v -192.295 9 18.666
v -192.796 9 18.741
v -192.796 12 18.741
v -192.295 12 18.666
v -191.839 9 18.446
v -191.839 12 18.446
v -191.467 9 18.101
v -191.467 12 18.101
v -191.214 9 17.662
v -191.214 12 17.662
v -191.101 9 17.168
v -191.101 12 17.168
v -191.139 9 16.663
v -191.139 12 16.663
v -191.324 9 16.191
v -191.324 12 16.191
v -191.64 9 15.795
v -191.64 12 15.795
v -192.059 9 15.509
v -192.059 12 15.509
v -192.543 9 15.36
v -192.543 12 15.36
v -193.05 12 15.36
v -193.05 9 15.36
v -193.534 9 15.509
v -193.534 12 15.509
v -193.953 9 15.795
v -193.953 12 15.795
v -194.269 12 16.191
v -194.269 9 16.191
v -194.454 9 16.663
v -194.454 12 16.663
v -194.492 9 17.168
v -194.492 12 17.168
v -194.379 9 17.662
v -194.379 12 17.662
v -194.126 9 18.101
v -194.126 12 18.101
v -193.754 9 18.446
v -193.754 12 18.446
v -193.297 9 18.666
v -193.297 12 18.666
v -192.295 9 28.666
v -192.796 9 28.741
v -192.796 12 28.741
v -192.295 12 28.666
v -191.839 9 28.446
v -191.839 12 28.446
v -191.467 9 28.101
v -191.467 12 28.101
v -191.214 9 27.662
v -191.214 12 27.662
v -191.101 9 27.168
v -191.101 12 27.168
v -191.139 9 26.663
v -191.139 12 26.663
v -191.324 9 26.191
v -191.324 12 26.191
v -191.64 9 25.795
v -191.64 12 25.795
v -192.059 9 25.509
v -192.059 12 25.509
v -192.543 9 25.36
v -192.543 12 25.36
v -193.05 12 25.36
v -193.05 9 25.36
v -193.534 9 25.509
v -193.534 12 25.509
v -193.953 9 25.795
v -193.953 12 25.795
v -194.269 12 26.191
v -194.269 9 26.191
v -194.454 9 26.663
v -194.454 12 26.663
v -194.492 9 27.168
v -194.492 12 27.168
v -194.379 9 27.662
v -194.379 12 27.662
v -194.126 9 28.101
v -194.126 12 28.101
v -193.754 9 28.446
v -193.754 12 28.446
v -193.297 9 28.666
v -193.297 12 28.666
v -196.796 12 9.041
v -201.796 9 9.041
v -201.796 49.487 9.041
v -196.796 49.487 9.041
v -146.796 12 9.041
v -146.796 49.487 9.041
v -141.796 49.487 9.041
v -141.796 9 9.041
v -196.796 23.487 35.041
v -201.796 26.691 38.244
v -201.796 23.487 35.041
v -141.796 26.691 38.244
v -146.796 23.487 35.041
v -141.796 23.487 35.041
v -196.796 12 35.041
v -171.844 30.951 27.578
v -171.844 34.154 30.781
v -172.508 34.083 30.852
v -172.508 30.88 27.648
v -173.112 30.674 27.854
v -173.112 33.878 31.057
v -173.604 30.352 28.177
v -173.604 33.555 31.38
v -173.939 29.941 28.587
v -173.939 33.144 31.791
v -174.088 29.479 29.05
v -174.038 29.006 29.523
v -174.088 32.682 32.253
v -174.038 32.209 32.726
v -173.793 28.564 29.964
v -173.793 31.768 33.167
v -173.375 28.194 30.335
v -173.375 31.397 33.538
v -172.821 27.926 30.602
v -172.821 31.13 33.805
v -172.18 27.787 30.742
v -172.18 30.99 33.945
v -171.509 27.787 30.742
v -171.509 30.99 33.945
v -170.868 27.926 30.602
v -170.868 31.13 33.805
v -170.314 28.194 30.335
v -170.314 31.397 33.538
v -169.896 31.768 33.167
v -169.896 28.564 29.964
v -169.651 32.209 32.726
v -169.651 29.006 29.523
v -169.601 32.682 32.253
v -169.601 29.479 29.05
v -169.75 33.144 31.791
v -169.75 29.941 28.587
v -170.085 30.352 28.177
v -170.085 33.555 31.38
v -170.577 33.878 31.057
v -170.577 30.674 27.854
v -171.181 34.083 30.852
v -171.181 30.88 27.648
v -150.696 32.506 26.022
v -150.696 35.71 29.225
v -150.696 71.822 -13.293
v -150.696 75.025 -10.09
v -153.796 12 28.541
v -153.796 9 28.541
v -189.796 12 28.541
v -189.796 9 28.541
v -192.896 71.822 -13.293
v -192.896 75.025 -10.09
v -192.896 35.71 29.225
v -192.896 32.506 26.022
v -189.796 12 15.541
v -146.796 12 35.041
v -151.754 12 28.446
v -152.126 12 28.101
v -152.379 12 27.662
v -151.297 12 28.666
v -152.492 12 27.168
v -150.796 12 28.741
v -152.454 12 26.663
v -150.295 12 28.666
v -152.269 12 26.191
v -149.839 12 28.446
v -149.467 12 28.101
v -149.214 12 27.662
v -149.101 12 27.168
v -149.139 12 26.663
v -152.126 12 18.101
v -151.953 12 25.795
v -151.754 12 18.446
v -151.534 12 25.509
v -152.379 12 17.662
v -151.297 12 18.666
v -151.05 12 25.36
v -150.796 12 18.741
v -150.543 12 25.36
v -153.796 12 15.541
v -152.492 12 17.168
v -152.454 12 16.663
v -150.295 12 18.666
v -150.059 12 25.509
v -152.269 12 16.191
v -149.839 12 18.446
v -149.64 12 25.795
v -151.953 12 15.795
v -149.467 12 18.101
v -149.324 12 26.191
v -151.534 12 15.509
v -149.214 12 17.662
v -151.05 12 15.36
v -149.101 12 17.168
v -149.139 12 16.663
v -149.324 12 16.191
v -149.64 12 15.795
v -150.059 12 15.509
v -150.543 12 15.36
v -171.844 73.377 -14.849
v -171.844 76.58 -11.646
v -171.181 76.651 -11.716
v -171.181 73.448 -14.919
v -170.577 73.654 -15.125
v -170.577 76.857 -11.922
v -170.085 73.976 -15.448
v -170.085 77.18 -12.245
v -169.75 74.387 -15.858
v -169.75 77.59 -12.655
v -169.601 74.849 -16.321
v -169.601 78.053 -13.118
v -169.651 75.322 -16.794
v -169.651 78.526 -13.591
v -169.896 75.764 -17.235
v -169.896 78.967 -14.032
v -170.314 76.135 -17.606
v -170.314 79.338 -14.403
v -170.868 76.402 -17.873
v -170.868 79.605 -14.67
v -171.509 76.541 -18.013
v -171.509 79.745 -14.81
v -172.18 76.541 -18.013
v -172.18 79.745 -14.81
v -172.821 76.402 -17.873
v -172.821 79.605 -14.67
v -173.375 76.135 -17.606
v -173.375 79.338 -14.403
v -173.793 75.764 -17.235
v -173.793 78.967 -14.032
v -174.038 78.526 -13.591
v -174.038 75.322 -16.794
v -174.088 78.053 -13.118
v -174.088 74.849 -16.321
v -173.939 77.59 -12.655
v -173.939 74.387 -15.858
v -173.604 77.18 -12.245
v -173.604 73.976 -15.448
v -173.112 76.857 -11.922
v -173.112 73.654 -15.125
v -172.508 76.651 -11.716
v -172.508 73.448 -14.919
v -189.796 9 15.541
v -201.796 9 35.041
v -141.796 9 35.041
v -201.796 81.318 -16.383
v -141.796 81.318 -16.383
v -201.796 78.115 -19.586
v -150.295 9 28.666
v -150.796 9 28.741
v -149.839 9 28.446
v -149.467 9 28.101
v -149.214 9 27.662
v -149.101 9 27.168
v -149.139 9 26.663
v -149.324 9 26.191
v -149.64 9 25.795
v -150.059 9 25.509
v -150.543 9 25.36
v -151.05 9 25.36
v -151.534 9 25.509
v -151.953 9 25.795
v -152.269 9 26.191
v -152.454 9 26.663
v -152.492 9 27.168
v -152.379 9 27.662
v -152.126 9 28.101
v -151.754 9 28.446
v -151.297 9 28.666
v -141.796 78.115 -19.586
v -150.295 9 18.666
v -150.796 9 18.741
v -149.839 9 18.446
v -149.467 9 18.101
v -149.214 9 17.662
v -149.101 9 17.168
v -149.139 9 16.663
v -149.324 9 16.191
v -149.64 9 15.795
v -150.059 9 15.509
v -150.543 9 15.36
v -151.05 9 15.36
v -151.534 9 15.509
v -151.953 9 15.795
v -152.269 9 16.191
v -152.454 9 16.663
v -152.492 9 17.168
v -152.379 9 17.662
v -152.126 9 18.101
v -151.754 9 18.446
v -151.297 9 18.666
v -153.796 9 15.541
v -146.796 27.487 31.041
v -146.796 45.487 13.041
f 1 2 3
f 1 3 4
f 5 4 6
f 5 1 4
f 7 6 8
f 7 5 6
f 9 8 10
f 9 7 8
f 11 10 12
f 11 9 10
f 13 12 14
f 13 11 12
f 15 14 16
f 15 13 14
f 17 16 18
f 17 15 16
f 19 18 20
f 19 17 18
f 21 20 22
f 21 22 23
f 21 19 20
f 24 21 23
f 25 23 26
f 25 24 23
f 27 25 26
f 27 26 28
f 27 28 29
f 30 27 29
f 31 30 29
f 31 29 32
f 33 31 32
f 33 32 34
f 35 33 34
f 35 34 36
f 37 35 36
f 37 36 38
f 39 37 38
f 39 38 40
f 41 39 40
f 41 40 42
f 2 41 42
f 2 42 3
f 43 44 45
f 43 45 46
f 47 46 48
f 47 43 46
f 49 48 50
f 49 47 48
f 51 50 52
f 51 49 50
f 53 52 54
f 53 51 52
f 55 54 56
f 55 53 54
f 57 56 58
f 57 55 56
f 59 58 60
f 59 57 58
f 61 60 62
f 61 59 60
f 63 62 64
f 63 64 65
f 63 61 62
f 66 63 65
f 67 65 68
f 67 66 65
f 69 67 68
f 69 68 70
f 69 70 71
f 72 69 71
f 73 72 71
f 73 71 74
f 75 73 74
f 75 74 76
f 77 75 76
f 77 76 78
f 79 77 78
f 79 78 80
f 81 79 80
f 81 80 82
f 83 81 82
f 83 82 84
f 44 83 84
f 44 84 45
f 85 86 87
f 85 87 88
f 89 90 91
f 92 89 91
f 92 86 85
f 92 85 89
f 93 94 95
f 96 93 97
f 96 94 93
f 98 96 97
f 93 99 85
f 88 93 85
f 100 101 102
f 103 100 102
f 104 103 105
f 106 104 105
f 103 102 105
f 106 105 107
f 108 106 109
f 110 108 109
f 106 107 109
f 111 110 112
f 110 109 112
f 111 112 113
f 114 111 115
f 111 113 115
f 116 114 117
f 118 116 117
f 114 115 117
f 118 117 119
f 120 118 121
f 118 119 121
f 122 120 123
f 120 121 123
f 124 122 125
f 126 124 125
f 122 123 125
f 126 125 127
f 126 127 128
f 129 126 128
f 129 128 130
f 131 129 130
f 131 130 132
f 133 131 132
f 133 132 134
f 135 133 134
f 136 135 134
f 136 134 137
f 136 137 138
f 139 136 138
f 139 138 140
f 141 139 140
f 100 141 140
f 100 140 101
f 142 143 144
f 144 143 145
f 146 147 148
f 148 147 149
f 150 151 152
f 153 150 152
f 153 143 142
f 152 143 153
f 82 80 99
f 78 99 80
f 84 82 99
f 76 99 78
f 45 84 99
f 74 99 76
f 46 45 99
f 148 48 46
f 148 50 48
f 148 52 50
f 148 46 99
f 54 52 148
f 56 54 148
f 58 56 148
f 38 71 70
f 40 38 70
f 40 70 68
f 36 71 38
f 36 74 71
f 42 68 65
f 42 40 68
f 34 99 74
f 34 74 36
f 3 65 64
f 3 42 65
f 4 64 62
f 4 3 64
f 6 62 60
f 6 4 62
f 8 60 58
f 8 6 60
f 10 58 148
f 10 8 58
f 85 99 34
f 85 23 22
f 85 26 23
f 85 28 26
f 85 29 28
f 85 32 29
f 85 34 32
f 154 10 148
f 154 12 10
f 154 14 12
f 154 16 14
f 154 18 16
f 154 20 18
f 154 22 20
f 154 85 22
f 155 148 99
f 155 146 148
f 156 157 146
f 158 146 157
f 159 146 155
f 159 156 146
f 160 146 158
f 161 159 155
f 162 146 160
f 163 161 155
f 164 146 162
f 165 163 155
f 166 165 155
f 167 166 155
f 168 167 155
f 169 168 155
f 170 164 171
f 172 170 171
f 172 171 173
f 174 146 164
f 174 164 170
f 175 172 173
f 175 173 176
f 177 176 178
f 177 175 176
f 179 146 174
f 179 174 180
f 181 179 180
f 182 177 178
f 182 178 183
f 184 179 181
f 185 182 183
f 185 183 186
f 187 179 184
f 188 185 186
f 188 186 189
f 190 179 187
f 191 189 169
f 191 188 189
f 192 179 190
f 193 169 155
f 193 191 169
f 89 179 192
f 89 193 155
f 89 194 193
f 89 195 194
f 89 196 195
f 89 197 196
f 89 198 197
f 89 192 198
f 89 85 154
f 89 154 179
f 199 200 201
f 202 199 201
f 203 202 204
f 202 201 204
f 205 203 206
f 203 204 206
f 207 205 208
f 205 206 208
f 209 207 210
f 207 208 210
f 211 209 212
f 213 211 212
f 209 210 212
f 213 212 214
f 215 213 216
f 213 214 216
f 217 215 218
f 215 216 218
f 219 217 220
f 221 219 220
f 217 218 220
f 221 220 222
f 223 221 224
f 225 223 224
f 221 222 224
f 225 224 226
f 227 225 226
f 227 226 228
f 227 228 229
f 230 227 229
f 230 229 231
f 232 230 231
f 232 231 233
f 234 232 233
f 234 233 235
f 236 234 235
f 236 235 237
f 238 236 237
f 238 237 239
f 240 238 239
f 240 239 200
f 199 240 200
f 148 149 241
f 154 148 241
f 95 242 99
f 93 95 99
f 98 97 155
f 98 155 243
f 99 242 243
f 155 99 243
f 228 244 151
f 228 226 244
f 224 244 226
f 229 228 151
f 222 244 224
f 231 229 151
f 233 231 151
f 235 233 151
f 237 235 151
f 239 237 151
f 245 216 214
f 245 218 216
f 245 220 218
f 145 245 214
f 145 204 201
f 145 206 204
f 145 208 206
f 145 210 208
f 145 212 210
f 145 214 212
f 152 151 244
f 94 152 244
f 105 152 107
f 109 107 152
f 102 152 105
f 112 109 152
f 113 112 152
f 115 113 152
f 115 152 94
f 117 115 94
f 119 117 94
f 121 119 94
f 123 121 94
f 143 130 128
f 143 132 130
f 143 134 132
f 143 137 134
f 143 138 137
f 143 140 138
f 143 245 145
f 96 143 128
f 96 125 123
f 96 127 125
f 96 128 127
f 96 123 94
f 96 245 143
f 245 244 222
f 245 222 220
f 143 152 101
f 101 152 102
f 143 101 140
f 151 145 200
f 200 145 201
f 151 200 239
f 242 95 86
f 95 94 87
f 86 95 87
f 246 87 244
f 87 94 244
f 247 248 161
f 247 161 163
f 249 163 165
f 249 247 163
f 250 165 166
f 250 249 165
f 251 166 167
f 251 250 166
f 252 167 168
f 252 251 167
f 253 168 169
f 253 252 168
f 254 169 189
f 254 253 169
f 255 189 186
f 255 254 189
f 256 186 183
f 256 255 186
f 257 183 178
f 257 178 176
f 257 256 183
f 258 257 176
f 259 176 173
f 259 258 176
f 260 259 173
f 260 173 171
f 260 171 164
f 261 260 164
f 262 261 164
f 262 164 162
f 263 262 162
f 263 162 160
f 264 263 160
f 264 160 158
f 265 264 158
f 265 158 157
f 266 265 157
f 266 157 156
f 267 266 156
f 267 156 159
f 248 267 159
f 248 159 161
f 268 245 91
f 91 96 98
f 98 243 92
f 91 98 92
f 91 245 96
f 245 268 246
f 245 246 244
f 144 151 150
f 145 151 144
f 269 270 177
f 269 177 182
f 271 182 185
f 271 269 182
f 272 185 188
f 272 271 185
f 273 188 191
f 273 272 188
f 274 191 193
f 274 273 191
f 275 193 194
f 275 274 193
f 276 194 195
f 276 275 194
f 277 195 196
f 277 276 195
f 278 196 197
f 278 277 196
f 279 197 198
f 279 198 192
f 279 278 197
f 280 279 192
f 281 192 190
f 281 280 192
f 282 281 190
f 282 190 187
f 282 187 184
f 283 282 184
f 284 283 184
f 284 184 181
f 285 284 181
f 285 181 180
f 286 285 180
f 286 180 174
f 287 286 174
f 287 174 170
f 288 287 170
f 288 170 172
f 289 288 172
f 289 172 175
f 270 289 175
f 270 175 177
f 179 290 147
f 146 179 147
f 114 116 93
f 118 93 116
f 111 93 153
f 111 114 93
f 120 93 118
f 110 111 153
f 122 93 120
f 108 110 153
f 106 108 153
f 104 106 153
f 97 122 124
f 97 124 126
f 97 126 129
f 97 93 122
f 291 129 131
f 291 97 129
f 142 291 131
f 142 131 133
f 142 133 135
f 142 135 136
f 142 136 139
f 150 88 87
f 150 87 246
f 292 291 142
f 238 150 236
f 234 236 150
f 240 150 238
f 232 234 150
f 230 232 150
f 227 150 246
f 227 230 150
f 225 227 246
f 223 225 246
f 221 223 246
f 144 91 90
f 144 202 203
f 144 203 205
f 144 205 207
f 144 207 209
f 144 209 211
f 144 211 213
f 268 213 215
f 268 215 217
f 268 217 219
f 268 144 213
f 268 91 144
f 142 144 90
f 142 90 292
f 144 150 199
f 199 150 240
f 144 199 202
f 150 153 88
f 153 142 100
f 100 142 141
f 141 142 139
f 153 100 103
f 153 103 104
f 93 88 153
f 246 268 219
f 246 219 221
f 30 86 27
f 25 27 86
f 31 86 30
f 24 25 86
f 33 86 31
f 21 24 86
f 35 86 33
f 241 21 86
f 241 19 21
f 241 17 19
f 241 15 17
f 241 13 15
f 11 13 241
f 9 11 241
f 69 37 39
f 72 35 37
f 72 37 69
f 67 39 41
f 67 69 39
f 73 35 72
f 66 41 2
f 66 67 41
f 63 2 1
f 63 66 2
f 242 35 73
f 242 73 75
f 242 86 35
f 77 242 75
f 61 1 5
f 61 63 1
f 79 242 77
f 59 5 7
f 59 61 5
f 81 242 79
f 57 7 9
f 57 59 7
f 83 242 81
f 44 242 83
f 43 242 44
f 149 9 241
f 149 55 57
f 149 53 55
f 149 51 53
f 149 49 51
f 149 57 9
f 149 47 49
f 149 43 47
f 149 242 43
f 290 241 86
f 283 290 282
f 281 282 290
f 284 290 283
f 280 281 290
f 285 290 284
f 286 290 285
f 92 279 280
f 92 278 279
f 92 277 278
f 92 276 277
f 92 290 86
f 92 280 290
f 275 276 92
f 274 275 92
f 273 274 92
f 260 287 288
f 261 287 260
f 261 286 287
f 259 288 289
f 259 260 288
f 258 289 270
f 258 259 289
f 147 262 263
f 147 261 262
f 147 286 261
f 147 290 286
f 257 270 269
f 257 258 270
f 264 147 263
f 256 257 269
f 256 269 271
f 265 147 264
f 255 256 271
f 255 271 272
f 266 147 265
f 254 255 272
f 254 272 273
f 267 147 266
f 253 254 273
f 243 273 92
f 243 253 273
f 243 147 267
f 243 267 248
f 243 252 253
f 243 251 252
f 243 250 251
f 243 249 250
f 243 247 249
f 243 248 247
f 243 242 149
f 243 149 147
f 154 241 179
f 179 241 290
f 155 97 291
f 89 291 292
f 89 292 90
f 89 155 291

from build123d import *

# Parameters (mm, degrees)
SKETCH_1_W                  = 60
SKETCH_1_H                  = 26
SKETCH_1_R                  = 1.7
EXTRUDE_3_DEPTH             = 12
SKETCH_10_W                 = 5
SKETCH_10_H                 = 4
EXTRUDE_4_DEPTH             = 60
EXTRUDE_START               = -60
EXTRUDE_6_DEPTH             = 60
CUT_EXTRUDE_6_REACH         = 219.643
SKETCH_20_W                 = 5
SKETCH_20_H                 = 4
CUT_EXTRUDE_7_REACH         = 219.643
SKETCH_21_W                 = 5
SKETCH_21_H                 = 4
CUT_EXTRUDE_8_REACH         = 219.643
SKETCH_22_W                 = 5
SKETCH_22_H                 = 4
SKETCH_23_R                 = 2.25
CUT_EXTRUDE_9_DEPTH         = 10
EXTRUDE_8_REACH             = 218.77
SKETCH_24_W                 = 5
SKETCH_24_H                 = 18
EXTRUDE_8_DIRECTION_2_REACH = 218.77
EXTRUDE_START_2             = -146.796406348
EXTRUDE_9_DEPTH             = 5
SKETCH_28_W                 = 60
SKETCH_28_H                 = 9
CUT_EXTRUDE_10_DEPTH        = 26


with BuildPart() as part:
    # 草图1 → 凸台-拉伸3 (new body)
    with BuildSketch(Plane(origin=(0, 0, 0), x_dir=(1, 0, 0), z_dir=(0, 1, 0))):
        with Locations((-171.796406348, -22.041144508)):
            Rectangle(SKETCH_1_W, SKETCH_1_H)
        with Locations(Location((-150.796406348, -17.041144508, 0), (0, 0, 270))):
            Circle(SKETCH_1_R, mode=Mode.SUBTRACT)
        with Locations(Location((-150.796406348, -27.041144508, 0), (0, 0, 270))):
            Circle(SKETCH_1_R, mode=Mode.SUBTRACT)
        with Locations(Location((-192.796406348, -27.041144508, 0), (0, 0, 270))):
            Circle(SKETCH_1_R, mode=Mode.SUBTRACT)
        with Locations(Location((-198.796406348, -27.041144508, 0), (0, 0, 270))):
            Circle(SKETCH_1_R, mode=Mode.SUBTRACT)
        with Locations(Location((-198.796406348, -17.041144508, 0), (0, 0, 270))):
            Circle(SKETCH_1_R, mode=Mode.SUBTRACT)
        with Locations(Location((-192.796406348, -17.041144508, 0), (0, 0, 270))):
            Circle(SKETCH_1_R, mode=Mode.SUBTRACT)
        with Locations(Location((-144.796406348, -27.041144508, 0), (0, 0, 270))):
            Circle(SKETCH_1_R, mode=Mode.SUBTRACT)
        with Locations(Location((-144.796406348, -17.041144508, 0), (0, 0, 270))):
            Circle(SKETCH_1_R, mode=Mode.SUBTRACT)
        Polygon((-154.244576261, -28.541144508), (-153.796406348, -28.541144508), (-153.796406348, -27.585746487), (-153.796406348, -16.496542529), (-153.796406348, -15.541144508), (-154.244576261, -15.541144508), (-160.170728493, -15.541144508), (-183.422084204, -15.541144508), (-189.348236436, -15.541144508), (-189.796406348, -15.541144508), (-189.796406348, -16.496542529), (-189.796406348, -27.585746487), (-189.796406348, -28.541144508), (-189.348236436, -28.541144508), (-183.422084204, -28.541144508), (-160.170728493, -28.541144508), align=None, mode=Mode.SUBTRACT)
    extrude(amount=EXTRUDE_3_DEPTH)

    # 草图10 → 凸台-拉伸4 (add)
    with BuildSketch(Plane(origin=(0, 12, 0), x_dir=(1, 0, 0), z_dir=(0, 1, 0))):
        with Locations((-144.296406348, -11.041144508)):
            Rectangle(SKETCH_10_W, SKETCH_10_H)
        with Locations((-199.296406348, -11.041144508)):
            Rectangle(SKETCH_10_W, SKETCH_10_H)
        with Locations((-199.296406348, -33.041144508)):
            Rectangle(SKETCH_10_W, SKETCH_10_H)
        with Locations((-144.296406348, -33.041144508)):
            Rectangle(SKETCH_10_W, SKETCH_10_H)
    extrude(amount=EXTRUDE_4_DEPTH)

    # 草图16 → 凸台-拉伸6 (add)
    with BuildSketch(Plane.ZY.offset(201.796406348).offset(EXTRUDE_START)):
        Polygon((35.041144508, 23.487382081), (-19.586360532, 78.114887122), (-16.383147731, 81.318099924), (38.24435731, 26.690594883), align=None)
    extrude(amount=EXTRUDE_6_DEPTH)

    # 切除-拉伸6: up to this plane
    cut_extrude_6_end = Plane(origin=(-60.011420854, 81.318099924, -16.383147731), z_dir=(0, 0.707106781186548, 0.7071067811865472))
    # 草图20 → 切除-拉伸6 (cut, up to the surface)
    with BuildSketch(Plane(origin=(0, 72, 0), x_dir=(1, 0, 0), z_dir=(0, 1, 0)), mode=Mode.PRIVATE) as cut_extrude_6_sk1:
        with Locations((-199.296406348, -11.041144508)):
            Rectangle(SKETCH_20_W, SKETCH_20_H)
    cut_extrude_6_tool1 = split(extrude(cut_extrude_6_sk1.sketch, amount=-CUT_EXTRUDE_6_REACH, mode=Mode.PRIVATE), bisect_by=cut_extrude_6_end, keep=Keep.BOTH, mode=Mode.PRIVATE)
    add(cut_extrude_6_tool1.solids().sort_by_distance((-199.296406, 72, 11.041145))[0], mode=Mode.SUBTRACT)

    # 切除-拉伸7: up to this face of the body (flat: up to its plane)
    cut_extrude_7_end = Plane(part.part.faces().sort_by_distance((-171.967338534, 54.279900151, 10.655052042))[0])
    # 草图21 → 切除-拉伸7 (cut, up to the picked face)
    with BuildSketch(Plane(origin=(0, 72, 0), x_dir=(1, 0, 0), z_dir=(0, 1, 0)), mode=Mode.PRIVATE) as cut_extrude_7_sk1:
        with Locations((-199.296406348, -33.041144508)):
            Rectangle(SKETCH_21_W, SKETCH_21_H)
    cut_extrude_7_tool1 = split(extrude(cut_extrude_7_sk1.sketch, amount=-CUT_EXTRUDE_7_REACH, mode=Mode.PRIVATE), bisect_by=cut_extrude_7_end, keep=Keep.BOTH, mode=Mode.PRIVATE)
    add(cut_extrude_7_tool1.solids().sort_by(Axis((-199.296406, 72, 33.041145), (0, -1, 0)))[0], mode=Mode.SUBTRACT)

    # 切除-拉伸8: up to this face of the body (flat: up to its plane)
    cut_extrude_8_end = Plane(part.part.faces().sort_by_distance((-172.136158915, 54.141614108, 10.793338085))[0])
    # 草图22 → 切除-拉伸8 (cut, up to the picked face)
    with BuildSketch(Plane(origin=(0, 72, 0), x_dir=(1, 0, 0), z_dir=(0, 1, 0)), mode=Mode.PRIVATE) as cut_extrude_8_sk1:
        with Locations((-144.296406348, -11.041144508)):
            Rectangle(SKETCH_22_W, SKETCH_22_H)
    cut_extrude_8_tool1 = split(extrude(cut_extrude_8_sk1.sketch, amount=-CUT_EXTRUDE_8_REACH, mode=Mode.PRIVATE), bisect_by=cut_extrude_8_end, keep=Keep.BOTH, mode=Mode.PRIVATE)
    # 草图22 → 切除-拉伸8 (cut, up to the picked face)
    with BuildSketch(Plane(origin=(0, 72, 0), x_dir=(1, 0, 0), z_dir=(0, 1, 0)), mode=Mode.PRIVATE) as cut_extrude_8_sk2:
        with Locations((-144.296406348, -33.041144508)):
            Rectangle(SKETCH_22_W, SKETCH_22_H)
    cut_extrude_8_tool2 = split(extrude(cut_extrude_8_sk2.sketch, amount=-CUT_EXTRUDE_8_REACH, mode=Mode.PRIVATE), bisect_by=cut_extrude_8_end, keep=Keep.BOTH, mode=Mode.PRIVATE)
    add(cut_extrude_8_tool1.solids().sort_by(Axis((-144.296406, 72, 11.041145), (0, -1, 0)))[0], mode=Mode.SUBTRACT)
    add(cut_extrude_8_tool2.solids().sort_by(Axis((-144.296406, 72, 33.041145), (0, -1, 0)))[0], mode=Mode.SUBTRACT)

    # 草图23 → 切除-拉伸9 (cut)
    with BuildSketch(Plane(origin=(0, 32.467476097, 32.467476097), x_dir=(1, 0, 0), z_dir=(0, 0.7071067811865478, 0.7071067811865472))):
        Polygon((-150.696406348, 25.486333053), (-150.696406348, 4.585214747), (-192.896406348, 4.585214747), (-192.896406348, 25.486333053), (-192.896406348, 57.849143044), (-192.896406348, 60.185214747), (-150.696406348, 60.185214747), (-150.696406348, 57.849143044), align=None)
        with Locations(Location((-171.844403565, 64.635214747, 0), (0, 0, 270))):
            Circle(SKETCH_23_R)
        with Locations(Location((-171.844403565, 0.135214747, 0), (0, 0, 90))):
            Circle(SKETCH_23_R)
    extrude(amount=-CUT_EXTRUDE_9_DEPTH, mode=Mode.SUBTRACT)

    # 草图24 → 凸台-拉伸8 (add, up to next)
    with BuildSketch(Plane(origin=(0, 12, 0), x_dir=(1, 0, 0), z_dir=(0, 1, 0)), mode=Mode.PRIVATE) as extrude_8_sk1:
        with Locations((-199.296406348, -22.041144508)):
            Rectangle(SKETCH_24_W, SKETCH_24_H)
    extrude_8_tool1 = extrude(extrude_8_sk1.sketch, amount=EXTRUDE_8_REACH, mode=Mode.PRIVATE) - part.part
    add(extrude_8_tool1.solids().sort_by_distance((-199.296406, 12, 22.041145))[0])

    # 凸台-拉伸8 direction 2: up to this face of the body (flat: up to its plane)
    extrude_8_direction_2_end = Plane(part.part.faces().sort_by_distance((-142.450317657, 0, 22.041144508))[0])
    # 草图24 → 凸台-拉伸8 direction 2 (add, up to the picked face)
    with BuildSketch(Plane(origin=(0, 12, 0), x_dir=(1, 0, 0), z_dir=(0, 1, 0)), mode=Mode.PRIVATE) as extrude_8_direction_2_sk1:
        with Locations((-199.296406348, -22.041144508)):
            Rectangle(SKETCH_24_W, SKETCH_24_H)
    extrude_8_direction_2_tool1 = split(extrude(extrude_8_direction_2_sk1.sketch, amount=-EXTRUDE_8_DIRECTION_2_REACH, mode=Mode.PRIVATE), bisect_by=extrude_8_direction_2_end, keep=Keep.BOTH, mode=Mode.PRIVATE)
    add(extrude_8_direction_2_tool1.solids().sort_by(Axis((-199.296406, 12, 22.041145), (0, -1, 0)))[0])

    # 凸台-拉伸9: read off the stored shape, not the designer's step
    # 凸台-拉伸9 outline → 凸台-拉伸9 (add)
    with BuildSketch(Plane.YZ.offset(EXTRUDE_START_2)):
        Polygon((49.487382081, 9.041144508), (23.487382081, 35.041144508), (0, 35.041144508), (0, 9.041144508), align=None)
    extrude(amount=EXTRUDE_9_DEPTH)

    # 草图28 → 切除-拉伸10 (cut)
    with BuildSketch(Plane.XY.offset(35.041144508)):
        with Locations((-171.796406348, 4.5)):
            Rectangle(SKETCH_28_W, SKETCH_28_H)
    extrude(amount=-CUT_EXTRUDE_10_DEPTH, mode=Mode.SUBTRACT)


solid = part.part
